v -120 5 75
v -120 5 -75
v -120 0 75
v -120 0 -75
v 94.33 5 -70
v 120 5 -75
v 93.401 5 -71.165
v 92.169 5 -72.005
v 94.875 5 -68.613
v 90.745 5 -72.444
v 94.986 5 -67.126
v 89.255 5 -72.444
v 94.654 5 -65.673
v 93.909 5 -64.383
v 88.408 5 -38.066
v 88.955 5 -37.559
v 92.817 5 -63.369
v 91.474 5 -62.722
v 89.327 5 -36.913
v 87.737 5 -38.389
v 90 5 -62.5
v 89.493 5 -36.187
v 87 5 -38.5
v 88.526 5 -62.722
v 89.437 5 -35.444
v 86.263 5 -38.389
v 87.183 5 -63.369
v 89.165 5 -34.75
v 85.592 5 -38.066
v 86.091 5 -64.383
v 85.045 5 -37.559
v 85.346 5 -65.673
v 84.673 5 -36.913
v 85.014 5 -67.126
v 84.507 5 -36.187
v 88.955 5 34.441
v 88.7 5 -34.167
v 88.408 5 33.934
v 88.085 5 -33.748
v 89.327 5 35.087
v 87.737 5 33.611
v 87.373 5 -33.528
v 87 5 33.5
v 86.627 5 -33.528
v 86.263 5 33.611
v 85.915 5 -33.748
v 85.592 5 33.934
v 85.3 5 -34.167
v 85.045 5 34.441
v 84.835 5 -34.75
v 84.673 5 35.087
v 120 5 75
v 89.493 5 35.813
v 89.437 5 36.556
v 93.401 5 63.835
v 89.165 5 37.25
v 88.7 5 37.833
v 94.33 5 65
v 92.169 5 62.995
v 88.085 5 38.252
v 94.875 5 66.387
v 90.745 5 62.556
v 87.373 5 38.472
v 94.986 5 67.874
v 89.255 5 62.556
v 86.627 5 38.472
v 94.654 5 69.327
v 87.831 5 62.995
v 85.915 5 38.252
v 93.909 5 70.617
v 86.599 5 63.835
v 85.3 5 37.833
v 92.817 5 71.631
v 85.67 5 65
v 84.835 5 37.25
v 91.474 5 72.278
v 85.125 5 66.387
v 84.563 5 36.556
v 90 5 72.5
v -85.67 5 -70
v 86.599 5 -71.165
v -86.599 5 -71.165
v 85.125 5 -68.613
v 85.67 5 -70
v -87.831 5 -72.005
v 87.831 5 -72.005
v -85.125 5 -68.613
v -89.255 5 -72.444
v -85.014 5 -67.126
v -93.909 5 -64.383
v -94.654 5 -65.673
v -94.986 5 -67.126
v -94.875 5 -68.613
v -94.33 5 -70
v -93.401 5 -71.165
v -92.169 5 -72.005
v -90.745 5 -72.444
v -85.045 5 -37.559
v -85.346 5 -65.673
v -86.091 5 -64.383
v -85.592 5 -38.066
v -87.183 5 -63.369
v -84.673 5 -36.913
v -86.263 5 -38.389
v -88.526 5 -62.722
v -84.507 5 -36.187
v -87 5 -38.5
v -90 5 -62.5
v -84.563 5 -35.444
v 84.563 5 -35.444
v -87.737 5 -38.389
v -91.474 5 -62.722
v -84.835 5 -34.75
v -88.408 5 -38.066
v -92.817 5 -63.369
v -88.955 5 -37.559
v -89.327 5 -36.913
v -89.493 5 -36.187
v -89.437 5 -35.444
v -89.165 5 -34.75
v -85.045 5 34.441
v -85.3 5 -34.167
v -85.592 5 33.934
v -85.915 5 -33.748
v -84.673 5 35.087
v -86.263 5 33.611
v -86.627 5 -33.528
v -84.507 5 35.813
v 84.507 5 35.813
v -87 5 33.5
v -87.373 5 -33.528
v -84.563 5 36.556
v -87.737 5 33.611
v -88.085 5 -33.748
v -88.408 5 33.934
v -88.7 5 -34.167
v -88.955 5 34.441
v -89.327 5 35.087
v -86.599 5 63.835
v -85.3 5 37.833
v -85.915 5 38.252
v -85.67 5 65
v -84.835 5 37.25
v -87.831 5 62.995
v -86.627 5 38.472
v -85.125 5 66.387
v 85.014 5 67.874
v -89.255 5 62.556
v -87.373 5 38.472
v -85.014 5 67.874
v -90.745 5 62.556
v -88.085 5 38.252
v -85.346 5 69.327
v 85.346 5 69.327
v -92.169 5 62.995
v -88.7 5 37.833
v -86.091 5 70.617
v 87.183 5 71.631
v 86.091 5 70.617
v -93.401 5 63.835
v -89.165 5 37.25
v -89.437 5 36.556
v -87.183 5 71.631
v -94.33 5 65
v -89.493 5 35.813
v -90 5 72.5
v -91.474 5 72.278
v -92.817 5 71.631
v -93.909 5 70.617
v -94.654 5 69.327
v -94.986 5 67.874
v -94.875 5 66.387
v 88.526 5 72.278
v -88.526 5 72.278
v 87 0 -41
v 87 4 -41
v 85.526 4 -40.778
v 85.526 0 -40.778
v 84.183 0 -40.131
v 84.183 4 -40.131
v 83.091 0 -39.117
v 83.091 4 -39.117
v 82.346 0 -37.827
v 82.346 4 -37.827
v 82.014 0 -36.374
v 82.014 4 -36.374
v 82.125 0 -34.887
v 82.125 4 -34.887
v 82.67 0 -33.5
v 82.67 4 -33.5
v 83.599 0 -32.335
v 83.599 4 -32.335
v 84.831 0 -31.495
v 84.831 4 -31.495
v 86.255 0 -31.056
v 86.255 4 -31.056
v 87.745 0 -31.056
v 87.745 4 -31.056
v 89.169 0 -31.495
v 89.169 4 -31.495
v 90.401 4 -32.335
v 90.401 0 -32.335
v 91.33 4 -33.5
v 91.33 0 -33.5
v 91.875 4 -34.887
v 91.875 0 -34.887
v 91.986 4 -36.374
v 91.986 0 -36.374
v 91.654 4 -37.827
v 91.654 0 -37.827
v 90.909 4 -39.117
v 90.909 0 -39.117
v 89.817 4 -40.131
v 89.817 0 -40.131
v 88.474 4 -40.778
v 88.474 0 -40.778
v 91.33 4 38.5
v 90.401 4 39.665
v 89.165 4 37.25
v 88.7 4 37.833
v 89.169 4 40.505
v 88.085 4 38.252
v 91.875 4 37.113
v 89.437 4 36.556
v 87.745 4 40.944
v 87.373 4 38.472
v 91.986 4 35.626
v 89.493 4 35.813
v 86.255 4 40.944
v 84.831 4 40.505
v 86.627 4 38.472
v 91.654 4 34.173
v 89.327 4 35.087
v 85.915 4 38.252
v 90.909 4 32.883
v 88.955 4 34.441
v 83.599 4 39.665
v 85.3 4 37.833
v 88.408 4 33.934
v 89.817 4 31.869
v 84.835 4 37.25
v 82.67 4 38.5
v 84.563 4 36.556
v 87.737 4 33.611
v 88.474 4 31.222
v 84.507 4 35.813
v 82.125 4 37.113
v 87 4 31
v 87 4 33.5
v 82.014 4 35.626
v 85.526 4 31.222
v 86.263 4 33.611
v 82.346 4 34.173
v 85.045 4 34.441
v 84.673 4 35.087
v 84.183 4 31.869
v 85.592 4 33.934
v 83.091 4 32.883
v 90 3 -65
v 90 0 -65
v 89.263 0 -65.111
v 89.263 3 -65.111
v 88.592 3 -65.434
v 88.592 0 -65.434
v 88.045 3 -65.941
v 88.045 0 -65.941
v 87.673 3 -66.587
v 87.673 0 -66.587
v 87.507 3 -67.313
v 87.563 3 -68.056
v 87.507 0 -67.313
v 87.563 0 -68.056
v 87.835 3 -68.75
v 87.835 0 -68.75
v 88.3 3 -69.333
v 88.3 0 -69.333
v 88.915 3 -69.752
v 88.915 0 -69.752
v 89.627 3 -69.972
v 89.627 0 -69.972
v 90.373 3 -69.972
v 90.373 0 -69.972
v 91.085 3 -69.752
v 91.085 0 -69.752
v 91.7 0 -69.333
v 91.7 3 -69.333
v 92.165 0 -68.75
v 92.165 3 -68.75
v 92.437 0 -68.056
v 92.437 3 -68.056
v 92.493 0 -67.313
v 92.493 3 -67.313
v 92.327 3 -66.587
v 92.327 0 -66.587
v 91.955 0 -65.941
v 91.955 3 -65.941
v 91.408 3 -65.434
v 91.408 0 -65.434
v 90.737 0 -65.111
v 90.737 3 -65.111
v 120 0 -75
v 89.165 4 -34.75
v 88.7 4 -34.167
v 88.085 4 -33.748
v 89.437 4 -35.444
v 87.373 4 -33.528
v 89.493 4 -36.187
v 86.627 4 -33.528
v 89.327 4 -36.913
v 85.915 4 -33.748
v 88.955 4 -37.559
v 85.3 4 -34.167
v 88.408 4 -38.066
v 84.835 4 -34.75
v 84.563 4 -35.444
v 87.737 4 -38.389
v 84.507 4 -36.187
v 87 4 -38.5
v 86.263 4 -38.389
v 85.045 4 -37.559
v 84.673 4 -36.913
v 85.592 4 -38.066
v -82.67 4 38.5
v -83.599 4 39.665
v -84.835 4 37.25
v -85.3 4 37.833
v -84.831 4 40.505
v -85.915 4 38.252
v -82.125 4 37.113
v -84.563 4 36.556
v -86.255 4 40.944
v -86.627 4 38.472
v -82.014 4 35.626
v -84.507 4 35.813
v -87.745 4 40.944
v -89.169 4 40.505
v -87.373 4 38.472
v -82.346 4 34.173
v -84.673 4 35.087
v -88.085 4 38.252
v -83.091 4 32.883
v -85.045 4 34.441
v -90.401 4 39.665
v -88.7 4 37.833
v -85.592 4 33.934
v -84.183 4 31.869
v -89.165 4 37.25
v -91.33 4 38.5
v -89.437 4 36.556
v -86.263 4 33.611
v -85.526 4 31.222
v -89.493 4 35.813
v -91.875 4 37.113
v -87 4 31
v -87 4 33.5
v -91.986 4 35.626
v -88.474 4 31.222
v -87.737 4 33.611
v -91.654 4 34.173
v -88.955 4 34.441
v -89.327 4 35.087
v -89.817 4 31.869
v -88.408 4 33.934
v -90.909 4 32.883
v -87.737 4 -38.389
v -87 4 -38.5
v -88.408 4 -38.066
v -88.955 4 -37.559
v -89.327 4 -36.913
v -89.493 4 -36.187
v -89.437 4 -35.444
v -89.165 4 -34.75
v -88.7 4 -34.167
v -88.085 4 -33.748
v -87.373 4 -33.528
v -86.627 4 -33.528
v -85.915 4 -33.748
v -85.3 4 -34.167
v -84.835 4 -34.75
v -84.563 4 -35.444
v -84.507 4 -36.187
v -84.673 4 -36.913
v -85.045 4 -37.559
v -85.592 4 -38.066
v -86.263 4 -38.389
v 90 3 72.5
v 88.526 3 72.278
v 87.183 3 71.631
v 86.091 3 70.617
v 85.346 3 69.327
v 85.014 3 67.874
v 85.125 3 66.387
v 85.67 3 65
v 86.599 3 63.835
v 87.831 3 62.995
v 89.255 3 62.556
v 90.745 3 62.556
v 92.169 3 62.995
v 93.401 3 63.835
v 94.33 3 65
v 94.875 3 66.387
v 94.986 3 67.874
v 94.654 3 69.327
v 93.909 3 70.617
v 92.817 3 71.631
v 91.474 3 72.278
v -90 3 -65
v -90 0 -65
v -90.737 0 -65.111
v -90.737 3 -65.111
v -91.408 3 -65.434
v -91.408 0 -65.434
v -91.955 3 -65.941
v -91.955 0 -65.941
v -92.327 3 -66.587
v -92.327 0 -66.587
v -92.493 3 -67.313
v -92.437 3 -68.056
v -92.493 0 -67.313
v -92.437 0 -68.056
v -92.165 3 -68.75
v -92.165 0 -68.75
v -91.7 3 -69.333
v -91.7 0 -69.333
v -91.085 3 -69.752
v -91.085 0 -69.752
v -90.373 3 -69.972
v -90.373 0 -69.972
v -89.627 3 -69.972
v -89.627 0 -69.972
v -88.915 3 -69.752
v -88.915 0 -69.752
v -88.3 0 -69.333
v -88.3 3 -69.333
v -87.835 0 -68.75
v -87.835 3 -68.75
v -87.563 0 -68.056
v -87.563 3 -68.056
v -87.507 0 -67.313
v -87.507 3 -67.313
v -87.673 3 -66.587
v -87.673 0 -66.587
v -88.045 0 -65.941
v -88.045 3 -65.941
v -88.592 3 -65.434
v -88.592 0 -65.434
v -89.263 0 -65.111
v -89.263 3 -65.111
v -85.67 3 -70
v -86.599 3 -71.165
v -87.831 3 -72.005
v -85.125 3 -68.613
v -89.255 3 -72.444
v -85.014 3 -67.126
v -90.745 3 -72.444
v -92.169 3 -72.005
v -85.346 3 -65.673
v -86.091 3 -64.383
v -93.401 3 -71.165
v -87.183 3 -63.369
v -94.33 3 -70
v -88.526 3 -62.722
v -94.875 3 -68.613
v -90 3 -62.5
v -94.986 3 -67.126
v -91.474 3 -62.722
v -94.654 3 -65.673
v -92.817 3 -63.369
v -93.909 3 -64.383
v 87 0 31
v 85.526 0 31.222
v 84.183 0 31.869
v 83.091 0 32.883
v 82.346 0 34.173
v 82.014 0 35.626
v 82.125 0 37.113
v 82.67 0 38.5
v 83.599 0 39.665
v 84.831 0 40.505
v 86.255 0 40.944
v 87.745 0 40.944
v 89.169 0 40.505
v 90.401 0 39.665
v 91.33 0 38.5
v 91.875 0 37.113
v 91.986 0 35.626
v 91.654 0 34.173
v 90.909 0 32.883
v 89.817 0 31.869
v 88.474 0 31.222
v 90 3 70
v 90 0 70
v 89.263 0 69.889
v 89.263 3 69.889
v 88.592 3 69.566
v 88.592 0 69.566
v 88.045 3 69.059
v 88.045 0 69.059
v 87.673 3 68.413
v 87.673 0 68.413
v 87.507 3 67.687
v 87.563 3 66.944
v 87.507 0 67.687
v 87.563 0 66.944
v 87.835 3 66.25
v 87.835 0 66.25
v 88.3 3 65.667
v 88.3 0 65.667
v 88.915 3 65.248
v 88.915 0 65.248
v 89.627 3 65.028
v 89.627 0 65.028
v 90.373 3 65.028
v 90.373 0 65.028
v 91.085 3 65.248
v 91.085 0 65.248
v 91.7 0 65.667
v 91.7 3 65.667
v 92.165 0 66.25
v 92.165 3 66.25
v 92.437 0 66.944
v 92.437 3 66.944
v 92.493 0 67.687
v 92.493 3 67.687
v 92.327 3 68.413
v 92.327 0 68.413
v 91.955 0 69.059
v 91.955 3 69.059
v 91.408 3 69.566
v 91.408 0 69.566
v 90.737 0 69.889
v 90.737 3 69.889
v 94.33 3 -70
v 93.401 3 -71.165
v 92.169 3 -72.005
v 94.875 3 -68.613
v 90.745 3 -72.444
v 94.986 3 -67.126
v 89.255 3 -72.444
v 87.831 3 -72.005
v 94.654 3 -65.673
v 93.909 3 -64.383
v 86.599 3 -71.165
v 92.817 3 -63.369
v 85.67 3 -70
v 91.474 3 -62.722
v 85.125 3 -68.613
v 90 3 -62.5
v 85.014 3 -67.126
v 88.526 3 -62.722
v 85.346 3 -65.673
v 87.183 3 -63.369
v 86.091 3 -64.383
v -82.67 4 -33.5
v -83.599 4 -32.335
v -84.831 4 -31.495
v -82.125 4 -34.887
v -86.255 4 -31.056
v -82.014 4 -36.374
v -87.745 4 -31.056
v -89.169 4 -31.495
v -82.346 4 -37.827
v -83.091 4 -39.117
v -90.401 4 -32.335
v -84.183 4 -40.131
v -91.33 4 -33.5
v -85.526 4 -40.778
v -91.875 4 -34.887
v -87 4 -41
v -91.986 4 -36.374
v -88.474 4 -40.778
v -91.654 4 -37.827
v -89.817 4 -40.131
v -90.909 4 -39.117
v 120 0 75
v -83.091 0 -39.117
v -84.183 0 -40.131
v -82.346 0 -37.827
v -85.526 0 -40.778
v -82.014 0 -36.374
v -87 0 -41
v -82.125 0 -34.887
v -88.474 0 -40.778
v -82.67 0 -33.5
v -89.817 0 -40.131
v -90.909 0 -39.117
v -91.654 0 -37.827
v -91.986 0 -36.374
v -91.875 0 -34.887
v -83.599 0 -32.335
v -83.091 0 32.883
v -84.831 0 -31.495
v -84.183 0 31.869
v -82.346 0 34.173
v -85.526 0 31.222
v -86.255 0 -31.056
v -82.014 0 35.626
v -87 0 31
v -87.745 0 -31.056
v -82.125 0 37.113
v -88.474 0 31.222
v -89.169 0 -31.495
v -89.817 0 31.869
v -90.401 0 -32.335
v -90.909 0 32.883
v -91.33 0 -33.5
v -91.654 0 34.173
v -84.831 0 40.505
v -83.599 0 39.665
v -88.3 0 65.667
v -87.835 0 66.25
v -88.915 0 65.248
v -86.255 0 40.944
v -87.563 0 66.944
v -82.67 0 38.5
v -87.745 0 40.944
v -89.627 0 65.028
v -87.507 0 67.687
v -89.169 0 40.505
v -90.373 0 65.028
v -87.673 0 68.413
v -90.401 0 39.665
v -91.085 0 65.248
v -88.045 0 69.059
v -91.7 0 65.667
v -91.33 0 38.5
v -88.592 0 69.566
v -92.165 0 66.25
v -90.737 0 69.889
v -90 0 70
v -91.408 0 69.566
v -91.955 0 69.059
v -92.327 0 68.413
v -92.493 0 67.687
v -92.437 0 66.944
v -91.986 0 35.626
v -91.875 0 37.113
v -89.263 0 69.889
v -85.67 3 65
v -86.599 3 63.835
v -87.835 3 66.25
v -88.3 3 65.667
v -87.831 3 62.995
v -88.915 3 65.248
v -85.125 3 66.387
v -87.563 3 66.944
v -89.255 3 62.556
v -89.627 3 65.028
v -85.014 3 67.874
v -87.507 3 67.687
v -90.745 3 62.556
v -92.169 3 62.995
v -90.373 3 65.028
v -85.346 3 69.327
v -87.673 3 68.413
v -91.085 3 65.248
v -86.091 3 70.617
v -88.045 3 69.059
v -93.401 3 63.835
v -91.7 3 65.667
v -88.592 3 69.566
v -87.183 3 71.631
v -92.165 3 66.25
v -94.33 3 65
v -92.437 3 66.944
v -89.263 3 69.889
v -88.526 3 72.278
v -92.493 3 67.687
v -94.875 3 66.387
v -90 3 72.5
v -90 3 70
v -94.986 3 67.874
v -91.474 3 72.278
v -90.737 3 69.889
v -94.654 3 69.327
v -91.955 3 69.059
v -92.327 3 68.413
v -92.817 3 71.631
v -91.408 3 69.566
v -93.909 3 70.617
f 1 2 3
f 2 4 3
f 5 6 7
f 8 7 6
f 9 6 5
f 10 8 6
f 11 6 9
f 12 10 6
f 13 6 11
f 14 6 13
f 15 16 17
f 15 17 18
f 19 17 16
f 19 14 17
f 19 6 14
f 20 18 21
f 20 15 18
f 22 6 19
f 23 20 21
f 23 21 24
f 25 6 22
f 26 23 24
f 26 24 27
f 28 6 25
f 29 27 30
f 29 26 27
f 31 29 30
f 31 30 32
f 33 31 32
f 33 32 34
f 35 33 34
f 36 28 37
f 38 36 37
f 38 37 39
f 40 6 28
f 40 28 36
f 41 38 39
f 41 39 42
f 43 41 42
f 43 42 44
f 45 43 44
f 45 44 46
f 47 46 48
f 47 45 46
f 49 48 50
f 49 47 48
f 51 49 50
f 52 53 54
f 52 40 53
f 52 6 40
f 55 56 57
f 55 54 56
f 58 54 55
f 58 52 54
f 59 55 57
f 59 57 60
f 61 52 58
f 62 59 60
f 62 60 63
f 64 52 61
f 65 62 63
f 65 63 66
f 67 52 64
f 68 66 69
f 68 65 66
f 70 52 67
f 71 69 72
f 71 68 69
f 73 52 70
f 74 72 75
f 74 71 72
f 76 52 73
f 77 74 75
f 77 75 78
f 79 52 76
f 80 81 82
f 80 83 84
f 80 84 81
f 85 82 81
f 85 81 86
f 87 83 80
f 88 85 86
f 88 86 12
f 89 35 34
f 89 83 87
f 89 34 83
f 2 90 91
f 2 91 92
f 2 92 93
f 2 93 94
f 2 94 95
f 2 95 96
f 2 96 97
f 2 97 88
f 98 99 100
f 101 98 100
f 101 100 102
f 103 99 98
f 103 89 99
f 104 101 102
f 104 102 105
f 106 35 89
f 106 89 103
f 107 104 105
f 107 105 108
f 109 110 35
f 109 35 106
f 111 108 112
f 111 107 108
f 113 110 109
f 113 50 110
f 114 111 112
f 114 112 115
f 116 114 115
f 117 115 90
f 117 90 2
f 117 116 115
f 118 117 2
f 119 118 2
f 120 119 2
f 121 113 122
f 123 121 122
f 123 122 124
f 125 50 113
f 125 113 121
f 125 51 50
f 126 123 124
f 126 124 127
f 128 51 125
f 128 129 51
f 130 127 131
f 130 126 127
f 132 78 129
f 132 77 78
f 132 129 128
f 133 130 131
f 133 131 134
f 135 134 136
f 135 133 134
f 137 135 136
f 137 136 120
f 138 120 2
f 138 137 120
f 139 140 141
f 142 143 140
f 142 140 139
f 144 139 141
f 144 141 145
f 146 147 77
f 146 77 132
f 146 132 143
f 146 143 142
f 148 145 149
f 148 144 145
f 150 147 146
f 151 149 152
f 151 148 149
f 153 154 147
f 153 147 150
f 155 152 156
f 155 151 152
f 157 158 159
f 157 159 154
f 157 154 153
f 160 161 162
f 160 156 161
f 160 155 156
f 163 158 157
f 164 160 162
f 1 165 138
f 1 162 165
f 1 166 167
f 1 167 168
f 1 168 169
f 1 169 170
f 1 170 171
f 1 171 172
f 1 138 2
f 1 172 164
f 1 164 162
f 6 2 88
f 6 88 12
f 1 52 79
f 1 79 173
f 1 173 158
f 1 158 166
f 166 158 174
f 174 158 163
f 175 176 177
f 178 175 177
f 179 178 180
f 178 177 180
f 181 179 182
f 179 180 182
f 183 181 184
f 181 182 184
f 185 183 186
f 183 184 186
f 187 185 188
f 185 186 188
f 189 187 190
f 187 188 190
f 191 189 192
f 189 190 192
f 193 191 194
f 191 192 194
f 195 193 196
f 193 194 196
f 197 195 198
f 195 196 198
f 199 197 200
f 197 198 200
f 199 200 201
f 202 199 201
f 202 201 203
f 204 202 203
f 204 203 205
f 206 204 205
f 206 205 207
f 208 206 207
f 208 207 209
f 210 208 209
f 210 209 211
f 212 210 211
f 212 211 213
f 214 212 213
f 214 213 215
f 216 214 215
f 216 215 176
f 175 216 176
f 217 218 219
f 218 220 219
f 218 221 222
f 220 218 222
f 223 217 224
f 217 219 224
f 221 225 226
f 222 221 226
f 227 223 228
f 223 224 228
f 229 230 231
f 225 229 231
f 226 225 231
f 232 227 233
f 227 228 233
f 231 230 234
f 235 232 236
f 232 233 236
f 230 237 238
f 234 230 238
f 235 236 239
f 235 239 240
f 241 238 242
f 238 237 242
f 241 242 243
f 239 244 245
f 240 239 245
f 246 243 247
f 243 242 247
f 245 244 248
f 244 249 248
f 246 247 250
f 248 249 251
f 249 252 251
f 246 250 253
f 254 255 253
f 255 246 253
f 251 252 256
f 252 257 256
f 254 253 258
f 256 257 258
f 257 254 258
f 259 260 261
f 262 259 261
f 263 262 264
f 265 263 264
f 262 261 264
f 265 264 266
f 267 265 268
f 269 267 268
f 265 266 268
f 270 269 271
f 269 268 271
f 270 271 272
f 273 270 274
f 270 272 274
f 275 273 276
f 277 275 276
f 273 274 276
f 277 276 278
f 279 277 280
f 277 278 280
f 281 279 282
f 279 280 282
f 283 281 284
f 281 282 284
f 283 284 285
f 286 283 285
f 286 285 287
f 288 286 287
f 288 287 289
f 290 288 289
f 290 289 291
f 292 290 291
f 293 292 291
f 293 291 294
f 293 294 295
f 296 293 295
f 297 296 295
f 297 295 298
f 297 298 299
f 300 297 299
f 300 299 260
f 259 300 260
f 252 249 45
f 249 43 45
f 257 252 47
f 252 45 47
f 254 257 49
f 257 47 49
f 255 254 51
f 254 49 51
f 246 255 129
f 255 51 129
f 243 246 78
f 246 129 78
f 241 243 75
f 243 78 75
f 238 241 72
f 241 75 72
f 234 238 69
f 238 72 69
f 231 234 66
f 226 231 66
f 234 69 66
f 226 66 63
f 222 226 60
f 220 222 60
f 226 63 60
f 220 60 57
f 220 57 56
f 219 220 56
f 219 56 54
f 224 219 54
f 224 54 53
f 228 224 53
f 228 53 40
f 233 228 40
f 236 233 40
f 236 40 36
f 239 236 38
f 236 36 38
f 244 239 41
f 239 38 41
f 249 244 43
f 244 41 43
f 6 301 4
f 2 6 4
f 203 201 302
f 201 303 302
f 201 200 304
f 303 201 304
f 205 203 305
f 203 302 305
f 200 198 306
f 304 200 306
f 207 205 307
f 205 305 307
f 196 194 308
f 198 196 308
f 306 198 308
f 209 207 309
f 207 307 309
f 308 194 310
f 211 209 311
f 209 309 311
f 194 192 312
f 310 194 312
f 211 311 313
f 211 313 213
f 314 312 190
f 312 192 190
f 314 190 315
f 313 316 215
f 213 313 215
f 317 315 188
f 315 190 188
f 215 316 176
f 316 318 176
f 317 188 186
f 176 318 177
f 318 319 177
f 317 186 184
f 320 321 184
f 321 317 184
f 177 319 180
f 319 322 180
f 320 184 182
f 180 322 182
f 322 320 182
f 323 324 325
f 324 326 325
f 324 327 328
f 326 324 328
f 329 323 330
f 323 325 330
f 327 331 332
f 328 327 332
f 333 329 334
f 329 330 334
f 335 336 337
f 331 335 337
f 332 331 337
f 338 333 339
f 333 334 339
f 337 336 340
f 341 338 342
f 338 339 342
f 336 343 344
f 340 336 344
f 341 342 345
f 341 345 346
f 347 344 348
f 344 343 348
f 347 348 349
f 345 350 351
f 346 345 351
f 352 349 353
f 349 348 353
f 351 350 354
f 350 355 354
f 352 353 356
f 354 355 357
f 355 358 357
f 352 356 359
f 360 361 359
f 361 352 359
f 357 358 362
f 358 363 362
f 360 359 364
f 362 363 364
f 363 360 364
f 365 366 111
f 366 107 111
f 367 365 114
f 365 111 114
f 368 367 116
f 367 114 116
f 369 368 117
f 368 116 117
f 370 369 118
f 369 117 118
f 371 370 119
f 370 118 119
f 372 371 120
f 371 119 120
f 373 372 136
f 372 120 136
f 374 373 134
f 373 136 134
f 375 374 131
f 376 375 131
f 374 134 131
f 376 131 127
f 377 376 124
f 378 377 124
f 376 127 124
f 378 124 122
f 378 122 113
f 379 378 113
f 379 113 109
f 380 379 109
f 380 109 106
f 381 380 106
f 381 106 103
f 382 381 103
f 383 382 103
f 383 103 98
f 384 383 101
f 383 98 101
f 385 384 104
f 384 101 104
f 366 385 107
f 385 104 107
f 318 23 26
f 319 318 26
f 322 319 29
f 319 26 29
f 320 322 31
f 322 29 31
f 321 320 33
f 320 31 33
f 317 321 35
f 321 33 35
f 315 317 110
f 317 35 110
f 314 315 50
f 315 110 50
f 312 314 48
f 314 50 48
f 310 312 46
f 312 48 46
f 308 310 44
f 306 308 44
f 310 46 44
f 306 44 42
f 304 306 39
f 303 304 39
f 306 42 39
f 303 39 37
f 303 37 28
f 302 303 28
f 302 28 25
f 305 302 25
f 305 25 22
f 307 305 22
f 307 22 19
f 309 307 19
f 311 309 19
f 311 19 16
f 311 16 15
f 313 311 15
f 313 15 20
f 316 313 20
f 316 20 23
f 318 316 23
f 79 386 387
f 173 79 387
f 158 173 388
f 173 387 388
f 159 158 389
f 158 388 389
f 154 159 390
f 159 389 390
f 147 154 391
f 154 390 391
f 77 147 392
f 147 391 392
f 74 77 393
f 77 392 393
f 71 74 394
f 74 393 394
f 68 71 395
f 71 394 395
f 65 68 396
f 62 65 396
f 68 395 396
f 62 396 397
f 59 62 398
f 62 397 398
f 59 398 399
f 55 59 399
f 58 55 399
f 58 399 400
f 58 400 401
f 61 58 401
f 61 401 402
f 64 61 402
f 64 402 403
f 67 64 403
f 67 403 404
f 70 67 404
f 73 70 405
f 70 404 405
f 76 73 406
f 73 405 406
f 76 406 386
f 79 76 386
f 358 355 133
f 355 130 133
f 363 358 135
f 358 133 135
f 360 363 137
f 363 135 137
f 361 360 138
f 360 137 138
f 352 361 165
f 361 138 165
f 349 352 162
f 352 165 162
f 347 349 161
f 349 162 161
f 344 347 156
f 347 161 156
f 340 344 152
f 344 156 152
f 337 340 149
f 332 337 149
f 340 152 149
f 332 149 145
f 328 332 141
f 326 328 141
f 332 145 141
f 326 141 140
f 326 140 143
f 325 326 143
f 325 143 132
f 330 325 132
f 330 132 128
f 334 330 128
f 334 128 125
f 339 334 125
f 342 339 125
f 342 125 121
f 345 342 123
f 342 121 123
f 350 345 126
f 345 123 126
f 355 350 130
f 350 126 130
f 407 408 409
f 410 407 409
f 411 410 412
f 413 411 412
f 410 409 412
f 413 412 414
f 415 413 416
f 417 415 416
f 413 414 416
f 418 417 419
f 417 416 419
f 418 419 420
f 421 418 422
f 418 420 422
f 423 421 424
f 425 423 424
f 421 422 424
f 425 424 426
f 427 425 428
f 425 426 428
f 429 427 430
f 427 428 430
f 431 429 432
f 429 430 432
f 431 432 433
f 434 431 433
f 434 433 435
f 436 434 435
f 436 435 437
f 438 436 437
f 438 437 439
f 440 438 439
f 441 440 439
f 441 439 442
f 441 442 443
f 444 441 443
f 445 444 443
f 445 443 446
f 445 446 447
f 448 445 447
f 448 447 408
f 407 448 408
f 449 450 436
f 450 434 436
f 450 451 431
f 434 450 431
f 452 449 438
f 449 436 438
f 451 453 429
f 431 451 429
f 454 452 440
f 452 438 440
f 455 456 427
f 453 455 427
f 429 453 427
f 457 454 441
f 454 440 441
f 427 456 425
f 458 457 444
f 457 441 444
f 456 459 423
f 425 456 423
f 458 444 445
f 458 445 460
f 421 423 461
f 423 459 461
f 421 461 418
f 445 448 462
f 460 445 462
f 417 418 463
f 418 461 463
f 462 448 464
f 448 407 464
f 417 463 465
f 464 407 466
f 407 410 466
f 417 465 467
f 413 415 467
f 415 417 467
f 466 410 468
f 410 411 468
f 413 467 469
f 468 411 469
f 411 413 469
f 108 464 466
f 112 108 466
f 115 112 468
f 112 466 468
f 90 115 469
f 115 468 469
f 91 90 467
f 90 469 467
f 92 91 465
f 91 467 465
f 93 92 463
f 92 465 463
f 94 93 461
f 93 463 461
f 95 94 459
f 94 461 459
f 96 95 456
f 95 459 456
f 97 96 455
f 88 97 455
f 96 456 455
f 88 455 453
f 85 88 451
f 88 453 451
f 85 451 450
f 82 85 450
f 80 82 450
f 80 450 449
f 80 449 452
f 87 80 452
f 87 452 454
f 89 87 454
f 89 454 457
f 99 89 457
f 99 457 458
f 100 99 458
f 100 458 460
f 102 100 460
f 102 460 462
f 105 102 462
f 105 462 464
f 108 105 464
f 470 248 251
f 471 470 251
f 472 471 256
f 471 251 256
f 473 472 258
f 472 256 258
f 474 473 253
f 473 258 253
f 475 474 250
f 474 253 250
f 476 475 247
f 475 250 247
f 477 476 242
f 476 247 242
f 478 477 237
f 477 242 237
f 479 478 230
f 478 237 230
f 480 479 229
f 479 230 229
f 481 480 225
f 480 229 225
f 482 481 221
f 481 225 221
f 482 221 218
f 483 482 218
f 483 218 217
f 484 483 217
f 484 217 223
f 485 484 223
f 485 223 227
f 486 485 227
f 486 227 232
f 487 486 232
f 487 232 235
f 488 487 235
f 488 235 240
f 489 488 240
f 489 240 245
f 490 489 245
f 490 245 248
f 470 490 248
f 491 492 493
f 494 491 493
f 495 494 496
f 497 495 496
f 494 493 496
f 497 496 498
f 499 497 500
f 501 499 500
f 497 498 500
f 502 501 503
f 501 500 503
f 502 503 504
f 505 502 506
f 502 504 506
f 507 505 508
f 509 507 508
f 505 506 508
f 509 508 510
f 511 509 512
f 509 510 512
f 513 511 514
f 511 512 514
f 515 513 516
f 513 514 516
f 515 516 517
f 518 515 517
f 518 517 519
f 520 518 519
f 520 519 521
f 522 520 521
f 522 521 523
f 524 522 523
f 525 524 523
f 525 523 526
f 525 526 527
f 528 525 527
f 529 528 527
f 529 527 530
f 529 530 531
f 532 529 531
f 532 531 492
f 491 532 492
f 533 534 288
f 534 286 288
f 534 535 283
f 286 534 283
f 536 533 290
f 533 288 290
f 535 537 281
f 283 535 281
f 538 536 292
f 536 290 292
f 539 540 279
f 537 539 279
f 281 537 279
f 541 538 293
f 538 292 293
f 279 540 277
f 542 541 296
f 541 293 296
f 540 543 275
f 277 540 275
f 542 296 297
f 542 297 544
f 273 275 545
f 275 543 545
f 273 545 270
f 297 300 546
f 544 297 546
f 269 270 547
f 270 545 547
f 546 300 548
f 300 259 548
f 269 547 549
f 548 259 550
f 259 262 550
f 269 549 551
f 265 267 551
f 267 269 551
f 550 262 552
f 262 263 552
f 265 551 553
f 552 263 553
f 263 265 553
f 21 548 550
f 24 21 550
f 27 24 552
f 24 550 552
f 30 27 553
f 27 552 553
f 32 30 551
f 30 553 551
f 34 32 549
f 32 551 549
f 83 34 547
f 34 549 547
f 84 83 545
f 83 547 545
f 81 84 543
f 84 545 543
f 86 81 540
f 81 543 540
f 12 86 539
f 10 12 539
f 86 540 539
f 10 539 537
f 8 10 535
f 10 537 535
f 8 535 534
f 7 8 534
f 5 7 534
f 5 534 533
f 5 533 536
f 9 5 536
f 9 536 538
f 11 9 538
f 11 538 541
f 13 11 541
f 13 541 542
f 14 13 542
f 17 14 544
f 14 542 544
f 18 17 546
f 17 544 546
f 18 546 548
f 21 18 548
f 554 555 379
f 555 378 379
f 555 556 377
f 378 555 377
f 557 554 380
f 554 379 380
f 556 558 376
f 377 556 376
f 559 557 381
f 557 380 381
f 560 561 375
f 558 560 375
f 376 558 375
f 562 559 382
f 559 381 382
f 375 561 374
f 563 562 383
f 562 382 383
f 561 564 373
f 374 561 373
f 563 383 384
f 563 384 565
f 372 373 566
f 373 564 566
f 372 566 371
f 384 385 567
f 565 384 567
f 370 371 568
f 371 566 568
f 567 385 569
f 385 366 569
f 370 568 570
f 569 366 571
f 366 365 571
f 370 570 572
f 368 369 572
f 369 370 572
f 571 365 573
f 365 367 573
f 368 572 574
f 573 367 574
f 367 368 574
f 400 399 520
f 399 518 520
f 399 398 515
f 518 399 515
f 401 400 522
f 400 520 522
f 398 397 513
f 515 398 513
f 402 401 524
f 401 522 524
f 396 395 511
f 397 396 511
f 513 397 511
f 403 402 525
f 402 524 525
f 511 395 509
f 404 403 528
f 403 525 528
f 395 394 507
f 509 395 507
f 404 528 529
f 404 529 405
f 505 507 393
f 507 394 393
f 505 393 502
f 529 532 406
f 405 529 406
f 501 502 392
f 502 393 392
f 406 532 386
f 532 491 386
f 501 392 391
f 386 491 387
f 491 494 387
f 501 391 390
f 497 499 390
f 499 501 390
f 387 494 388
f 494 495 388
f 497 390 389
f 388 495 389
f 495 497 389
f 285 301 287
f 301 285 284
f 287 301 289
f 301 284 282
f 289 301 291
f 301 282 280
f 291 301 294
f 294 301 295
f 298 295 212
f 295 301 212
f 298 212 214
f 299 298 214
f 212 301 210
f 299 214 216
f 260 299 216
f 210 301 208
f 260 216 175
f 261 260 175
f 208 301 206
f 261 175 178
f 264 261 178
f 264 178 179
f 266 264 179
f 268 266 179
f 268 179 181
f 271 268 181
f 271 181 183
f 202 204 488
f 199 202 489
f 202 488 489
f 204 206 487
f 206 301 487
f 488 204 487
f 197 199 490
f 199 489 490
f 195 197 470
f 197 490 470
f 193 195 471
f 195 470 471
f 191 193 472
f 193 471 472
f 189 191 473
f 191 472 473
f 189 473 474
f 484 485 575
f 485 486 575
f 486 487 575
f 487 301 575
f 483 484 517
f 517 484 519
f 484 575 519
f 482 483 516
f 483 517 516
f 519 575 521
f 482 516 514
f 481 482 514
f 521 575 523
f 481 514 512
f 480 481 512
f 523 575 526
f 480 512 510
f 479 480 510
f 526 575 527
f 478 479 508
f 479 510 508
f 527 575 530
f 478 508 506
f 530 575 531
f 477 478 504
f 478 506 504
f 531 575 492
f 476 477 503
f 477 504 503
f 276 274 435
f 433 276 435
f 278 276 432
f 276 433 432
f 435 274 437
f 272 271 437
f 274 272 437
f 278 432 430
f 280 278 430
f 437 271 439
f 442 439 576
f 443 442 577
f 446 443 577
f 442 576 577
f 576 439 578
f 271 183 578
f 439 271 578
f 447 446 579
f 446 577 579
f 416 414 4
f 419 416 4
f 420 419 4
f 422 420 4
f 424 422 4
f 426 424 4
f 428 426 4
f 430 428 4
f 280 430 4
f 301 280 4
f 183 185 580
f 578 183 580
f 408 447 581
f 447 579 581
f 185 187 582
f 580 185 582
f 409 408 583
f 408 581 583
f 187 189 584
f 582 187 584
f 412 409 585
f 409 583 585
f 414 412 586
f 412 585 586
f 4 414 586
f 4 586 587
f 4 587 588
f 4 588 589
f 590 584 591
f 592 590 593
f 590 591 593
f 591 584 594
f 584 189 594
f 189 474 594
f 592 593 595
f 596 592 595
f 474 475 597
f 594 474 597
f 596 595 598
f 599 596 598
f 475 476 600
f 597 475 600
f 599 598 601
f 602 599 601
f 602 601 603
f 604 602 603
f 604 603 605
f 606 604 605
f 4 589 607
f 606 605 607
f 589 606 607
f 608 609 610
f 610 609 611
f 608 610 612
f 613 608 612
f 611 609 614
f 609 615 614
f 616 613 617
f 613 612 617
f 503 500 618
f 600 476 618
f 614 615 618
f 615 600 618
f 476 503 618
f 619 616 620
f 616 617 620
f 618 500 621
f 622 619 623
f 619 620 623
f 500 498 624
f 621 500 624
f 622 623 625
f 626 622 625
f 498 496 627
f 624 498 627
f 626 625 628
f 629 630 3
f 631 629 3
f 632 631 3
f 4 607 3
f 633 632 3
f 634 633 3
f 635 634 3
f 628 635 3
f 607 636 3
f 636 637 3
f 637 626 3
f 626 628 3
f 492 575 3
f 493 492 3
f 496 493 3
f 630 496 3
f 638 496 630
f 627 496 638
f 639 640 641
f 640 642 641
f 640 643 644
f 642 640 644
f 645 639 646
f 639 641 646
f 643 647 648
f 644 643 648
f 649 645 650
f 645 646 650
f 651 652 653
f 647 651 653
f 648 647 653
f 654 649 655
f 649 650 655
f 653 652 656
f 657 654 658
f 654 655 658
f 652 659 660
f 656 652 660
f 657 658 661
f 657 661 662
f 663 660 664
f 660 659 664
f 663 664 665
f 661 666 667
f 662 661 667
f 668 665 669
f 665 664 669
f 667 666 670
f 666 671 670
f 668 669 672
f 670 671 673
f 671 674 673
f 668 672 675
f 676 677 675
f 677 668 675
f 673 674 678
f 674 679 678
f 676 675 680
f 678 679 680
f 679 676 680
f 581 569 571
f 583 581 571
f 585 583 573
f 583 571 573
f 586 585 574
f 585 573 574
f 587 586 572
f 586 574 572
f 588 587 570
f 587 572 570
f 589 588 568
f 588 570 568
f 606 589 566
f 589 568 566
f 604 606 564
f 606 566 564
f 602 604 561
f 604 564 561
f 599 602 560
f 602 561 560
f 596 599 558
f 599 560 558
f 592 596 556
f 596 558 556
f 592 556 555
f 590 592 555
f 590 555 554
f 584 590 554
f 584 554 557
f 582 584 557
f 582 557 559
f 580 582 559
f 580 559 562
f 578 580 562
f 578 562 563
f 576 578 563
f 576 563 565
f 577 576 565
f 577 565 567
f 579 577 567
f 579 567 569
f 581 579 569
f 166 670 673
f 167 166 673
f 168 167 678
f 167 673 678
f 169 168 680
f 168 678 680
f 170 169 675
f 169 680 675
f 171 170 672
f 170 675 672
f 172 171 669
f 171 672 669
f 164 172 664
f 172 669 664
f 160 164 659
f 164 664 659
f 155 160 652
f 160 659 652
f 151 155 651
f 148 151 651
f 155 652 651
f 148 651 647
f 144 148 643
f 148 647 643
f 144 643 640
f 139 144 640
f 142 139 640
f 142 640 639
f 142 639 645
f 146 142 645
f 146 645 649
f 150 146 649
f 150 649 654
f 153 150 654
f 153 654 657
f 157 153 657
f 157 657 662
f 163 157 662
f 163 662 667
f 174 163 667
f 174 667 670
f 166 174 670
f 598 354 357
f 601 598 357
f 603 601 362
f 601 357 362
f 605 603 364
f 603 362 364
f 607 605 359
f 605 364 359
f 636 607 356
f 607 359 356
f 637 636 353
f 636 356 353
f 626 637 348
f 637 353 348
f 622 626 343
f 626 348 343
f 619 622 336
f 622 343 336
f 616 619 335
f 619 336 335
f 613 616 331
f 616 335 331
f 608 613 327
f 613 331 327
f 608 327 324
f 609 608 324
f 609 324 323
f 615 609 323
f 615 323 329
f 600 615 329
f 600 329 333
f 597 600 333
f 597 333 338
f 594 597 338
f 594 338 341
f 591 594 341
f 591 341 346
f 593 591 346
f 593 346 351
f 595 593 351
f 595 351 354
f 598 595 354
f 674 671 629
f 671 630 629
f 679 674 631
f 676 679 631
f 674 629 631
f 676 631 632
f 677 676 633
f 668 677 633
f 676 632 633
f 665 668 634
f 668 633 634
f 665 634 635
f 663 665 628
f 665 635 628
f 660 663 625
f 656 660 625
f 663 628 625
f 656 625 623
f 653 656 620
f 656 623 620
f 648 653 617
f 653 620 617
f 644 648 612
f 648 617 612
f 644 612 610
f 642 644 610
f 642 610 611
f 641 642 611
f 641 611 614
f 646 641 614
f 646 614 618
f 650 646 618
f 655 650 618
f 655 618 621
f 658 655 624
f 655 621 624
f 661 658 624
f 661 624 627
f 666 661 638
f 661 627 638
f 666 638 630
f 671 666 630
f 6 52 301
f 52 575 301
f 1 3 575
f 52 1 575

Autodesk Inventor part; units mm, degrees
ref_plane "YZ Plane" through (0, 0, 0) normal (1, 0, 0) x (0, 1, 0)
ref_plane "XZ Plane" through (0, 0, 0) normal (0, 1, 0) x (-1, 0, 0)
ref_plane "XY Plane" through (0, 0, 0) normal (0, 0, 1) x (1, 0, 0)
sketch "Sketch1" plane through (0, 0, 0) normal (0, 1, 0) x (-1, 0, 0)
  line L0 (-120, -75) -> (120, -75)
  line L1 (120, -75) -> (120, 75)
  line L2 (120, 75) -> (-120, 75)
  line L3 (-120, 75) -> (-120, -75)
  line L4 (-120, -75) -> (120, 75) construction
  line L5 (120, -75) -> (-120, 75) construction
  point P0 (0, 0)
  dimension "d0" = 240
  dimension "d1" = 150
extrude "Extrusion1" add sketch "Sketch1" along normal blind 5
sketch "Sketch2" plane through (0, 0, 0) normal (0, 1, 0) x (1, 0, 0)
  line L0 (-120, 75) -> (-120, -75) projected
  line L1 (-120, -75) -> (120, -75) projected
  line L2 (120, -75) -> (120, 75) projected
  line L3 (120, 75) -> (-120, 75) projected
  line L4 (-87, -36) -> (87, -36) construction
  line L5 (87, -36) -> (87, 36) construction
  line L6 (87, 36) -> (-87, 36) construction
  line L7 (-87, 36) -> (-87, -36) construction
  line L8 (-120, 0) -> (-87, 0) construction
  line L9 (0, 36) -> (0, 75) construction
  line L10 (0, -36) -> (0, -75) construction
  line L11 (87, 0) -> (120, 0) construction
  point P0 (0, 0)
  dimension "d4" = 72
  dimension "d5" = 174
hole "Hole1" at (-87, 0, 36) at (-87, 0, -36) at (87, 0, -36) at (87, 0, 36) direction (0, 1, 0) diameter 5 end through all counterbore diameter 10 counterbore depth 4
sketch "Sketch3" plane through (0, 5, 0) normal (0, 1, 0) x (1, 0, 0)
  line L0 (-90, -67.5) -> (90, -67.5) construction
  line L1 (90, -67.5) -> (90, 67.5) construction
  line L2 (90, 67.5) -> (-90, 67.5) construction
  line L3 (-90, 67.5) -> (-90, -67.5) construction
  line L4 (-90, -67.5) -> (90, 67.5) construction
  line L5 (90, -67.5) -> (-90, 67.5) construction
  point P0 (0, 0)
  dimension "d13" = 180
  dimension "d14" = 135
hole "Hole2" at (90, 5, -67.5) at (90, 5, 67.5) at (-90, 5, 67.5) at (-90, 5, -67.5) direction (0, -1, 0) diameter 5 end through all counterbore diameter 10 counterbore depth 2
properties part number "Hotplate Mount"
